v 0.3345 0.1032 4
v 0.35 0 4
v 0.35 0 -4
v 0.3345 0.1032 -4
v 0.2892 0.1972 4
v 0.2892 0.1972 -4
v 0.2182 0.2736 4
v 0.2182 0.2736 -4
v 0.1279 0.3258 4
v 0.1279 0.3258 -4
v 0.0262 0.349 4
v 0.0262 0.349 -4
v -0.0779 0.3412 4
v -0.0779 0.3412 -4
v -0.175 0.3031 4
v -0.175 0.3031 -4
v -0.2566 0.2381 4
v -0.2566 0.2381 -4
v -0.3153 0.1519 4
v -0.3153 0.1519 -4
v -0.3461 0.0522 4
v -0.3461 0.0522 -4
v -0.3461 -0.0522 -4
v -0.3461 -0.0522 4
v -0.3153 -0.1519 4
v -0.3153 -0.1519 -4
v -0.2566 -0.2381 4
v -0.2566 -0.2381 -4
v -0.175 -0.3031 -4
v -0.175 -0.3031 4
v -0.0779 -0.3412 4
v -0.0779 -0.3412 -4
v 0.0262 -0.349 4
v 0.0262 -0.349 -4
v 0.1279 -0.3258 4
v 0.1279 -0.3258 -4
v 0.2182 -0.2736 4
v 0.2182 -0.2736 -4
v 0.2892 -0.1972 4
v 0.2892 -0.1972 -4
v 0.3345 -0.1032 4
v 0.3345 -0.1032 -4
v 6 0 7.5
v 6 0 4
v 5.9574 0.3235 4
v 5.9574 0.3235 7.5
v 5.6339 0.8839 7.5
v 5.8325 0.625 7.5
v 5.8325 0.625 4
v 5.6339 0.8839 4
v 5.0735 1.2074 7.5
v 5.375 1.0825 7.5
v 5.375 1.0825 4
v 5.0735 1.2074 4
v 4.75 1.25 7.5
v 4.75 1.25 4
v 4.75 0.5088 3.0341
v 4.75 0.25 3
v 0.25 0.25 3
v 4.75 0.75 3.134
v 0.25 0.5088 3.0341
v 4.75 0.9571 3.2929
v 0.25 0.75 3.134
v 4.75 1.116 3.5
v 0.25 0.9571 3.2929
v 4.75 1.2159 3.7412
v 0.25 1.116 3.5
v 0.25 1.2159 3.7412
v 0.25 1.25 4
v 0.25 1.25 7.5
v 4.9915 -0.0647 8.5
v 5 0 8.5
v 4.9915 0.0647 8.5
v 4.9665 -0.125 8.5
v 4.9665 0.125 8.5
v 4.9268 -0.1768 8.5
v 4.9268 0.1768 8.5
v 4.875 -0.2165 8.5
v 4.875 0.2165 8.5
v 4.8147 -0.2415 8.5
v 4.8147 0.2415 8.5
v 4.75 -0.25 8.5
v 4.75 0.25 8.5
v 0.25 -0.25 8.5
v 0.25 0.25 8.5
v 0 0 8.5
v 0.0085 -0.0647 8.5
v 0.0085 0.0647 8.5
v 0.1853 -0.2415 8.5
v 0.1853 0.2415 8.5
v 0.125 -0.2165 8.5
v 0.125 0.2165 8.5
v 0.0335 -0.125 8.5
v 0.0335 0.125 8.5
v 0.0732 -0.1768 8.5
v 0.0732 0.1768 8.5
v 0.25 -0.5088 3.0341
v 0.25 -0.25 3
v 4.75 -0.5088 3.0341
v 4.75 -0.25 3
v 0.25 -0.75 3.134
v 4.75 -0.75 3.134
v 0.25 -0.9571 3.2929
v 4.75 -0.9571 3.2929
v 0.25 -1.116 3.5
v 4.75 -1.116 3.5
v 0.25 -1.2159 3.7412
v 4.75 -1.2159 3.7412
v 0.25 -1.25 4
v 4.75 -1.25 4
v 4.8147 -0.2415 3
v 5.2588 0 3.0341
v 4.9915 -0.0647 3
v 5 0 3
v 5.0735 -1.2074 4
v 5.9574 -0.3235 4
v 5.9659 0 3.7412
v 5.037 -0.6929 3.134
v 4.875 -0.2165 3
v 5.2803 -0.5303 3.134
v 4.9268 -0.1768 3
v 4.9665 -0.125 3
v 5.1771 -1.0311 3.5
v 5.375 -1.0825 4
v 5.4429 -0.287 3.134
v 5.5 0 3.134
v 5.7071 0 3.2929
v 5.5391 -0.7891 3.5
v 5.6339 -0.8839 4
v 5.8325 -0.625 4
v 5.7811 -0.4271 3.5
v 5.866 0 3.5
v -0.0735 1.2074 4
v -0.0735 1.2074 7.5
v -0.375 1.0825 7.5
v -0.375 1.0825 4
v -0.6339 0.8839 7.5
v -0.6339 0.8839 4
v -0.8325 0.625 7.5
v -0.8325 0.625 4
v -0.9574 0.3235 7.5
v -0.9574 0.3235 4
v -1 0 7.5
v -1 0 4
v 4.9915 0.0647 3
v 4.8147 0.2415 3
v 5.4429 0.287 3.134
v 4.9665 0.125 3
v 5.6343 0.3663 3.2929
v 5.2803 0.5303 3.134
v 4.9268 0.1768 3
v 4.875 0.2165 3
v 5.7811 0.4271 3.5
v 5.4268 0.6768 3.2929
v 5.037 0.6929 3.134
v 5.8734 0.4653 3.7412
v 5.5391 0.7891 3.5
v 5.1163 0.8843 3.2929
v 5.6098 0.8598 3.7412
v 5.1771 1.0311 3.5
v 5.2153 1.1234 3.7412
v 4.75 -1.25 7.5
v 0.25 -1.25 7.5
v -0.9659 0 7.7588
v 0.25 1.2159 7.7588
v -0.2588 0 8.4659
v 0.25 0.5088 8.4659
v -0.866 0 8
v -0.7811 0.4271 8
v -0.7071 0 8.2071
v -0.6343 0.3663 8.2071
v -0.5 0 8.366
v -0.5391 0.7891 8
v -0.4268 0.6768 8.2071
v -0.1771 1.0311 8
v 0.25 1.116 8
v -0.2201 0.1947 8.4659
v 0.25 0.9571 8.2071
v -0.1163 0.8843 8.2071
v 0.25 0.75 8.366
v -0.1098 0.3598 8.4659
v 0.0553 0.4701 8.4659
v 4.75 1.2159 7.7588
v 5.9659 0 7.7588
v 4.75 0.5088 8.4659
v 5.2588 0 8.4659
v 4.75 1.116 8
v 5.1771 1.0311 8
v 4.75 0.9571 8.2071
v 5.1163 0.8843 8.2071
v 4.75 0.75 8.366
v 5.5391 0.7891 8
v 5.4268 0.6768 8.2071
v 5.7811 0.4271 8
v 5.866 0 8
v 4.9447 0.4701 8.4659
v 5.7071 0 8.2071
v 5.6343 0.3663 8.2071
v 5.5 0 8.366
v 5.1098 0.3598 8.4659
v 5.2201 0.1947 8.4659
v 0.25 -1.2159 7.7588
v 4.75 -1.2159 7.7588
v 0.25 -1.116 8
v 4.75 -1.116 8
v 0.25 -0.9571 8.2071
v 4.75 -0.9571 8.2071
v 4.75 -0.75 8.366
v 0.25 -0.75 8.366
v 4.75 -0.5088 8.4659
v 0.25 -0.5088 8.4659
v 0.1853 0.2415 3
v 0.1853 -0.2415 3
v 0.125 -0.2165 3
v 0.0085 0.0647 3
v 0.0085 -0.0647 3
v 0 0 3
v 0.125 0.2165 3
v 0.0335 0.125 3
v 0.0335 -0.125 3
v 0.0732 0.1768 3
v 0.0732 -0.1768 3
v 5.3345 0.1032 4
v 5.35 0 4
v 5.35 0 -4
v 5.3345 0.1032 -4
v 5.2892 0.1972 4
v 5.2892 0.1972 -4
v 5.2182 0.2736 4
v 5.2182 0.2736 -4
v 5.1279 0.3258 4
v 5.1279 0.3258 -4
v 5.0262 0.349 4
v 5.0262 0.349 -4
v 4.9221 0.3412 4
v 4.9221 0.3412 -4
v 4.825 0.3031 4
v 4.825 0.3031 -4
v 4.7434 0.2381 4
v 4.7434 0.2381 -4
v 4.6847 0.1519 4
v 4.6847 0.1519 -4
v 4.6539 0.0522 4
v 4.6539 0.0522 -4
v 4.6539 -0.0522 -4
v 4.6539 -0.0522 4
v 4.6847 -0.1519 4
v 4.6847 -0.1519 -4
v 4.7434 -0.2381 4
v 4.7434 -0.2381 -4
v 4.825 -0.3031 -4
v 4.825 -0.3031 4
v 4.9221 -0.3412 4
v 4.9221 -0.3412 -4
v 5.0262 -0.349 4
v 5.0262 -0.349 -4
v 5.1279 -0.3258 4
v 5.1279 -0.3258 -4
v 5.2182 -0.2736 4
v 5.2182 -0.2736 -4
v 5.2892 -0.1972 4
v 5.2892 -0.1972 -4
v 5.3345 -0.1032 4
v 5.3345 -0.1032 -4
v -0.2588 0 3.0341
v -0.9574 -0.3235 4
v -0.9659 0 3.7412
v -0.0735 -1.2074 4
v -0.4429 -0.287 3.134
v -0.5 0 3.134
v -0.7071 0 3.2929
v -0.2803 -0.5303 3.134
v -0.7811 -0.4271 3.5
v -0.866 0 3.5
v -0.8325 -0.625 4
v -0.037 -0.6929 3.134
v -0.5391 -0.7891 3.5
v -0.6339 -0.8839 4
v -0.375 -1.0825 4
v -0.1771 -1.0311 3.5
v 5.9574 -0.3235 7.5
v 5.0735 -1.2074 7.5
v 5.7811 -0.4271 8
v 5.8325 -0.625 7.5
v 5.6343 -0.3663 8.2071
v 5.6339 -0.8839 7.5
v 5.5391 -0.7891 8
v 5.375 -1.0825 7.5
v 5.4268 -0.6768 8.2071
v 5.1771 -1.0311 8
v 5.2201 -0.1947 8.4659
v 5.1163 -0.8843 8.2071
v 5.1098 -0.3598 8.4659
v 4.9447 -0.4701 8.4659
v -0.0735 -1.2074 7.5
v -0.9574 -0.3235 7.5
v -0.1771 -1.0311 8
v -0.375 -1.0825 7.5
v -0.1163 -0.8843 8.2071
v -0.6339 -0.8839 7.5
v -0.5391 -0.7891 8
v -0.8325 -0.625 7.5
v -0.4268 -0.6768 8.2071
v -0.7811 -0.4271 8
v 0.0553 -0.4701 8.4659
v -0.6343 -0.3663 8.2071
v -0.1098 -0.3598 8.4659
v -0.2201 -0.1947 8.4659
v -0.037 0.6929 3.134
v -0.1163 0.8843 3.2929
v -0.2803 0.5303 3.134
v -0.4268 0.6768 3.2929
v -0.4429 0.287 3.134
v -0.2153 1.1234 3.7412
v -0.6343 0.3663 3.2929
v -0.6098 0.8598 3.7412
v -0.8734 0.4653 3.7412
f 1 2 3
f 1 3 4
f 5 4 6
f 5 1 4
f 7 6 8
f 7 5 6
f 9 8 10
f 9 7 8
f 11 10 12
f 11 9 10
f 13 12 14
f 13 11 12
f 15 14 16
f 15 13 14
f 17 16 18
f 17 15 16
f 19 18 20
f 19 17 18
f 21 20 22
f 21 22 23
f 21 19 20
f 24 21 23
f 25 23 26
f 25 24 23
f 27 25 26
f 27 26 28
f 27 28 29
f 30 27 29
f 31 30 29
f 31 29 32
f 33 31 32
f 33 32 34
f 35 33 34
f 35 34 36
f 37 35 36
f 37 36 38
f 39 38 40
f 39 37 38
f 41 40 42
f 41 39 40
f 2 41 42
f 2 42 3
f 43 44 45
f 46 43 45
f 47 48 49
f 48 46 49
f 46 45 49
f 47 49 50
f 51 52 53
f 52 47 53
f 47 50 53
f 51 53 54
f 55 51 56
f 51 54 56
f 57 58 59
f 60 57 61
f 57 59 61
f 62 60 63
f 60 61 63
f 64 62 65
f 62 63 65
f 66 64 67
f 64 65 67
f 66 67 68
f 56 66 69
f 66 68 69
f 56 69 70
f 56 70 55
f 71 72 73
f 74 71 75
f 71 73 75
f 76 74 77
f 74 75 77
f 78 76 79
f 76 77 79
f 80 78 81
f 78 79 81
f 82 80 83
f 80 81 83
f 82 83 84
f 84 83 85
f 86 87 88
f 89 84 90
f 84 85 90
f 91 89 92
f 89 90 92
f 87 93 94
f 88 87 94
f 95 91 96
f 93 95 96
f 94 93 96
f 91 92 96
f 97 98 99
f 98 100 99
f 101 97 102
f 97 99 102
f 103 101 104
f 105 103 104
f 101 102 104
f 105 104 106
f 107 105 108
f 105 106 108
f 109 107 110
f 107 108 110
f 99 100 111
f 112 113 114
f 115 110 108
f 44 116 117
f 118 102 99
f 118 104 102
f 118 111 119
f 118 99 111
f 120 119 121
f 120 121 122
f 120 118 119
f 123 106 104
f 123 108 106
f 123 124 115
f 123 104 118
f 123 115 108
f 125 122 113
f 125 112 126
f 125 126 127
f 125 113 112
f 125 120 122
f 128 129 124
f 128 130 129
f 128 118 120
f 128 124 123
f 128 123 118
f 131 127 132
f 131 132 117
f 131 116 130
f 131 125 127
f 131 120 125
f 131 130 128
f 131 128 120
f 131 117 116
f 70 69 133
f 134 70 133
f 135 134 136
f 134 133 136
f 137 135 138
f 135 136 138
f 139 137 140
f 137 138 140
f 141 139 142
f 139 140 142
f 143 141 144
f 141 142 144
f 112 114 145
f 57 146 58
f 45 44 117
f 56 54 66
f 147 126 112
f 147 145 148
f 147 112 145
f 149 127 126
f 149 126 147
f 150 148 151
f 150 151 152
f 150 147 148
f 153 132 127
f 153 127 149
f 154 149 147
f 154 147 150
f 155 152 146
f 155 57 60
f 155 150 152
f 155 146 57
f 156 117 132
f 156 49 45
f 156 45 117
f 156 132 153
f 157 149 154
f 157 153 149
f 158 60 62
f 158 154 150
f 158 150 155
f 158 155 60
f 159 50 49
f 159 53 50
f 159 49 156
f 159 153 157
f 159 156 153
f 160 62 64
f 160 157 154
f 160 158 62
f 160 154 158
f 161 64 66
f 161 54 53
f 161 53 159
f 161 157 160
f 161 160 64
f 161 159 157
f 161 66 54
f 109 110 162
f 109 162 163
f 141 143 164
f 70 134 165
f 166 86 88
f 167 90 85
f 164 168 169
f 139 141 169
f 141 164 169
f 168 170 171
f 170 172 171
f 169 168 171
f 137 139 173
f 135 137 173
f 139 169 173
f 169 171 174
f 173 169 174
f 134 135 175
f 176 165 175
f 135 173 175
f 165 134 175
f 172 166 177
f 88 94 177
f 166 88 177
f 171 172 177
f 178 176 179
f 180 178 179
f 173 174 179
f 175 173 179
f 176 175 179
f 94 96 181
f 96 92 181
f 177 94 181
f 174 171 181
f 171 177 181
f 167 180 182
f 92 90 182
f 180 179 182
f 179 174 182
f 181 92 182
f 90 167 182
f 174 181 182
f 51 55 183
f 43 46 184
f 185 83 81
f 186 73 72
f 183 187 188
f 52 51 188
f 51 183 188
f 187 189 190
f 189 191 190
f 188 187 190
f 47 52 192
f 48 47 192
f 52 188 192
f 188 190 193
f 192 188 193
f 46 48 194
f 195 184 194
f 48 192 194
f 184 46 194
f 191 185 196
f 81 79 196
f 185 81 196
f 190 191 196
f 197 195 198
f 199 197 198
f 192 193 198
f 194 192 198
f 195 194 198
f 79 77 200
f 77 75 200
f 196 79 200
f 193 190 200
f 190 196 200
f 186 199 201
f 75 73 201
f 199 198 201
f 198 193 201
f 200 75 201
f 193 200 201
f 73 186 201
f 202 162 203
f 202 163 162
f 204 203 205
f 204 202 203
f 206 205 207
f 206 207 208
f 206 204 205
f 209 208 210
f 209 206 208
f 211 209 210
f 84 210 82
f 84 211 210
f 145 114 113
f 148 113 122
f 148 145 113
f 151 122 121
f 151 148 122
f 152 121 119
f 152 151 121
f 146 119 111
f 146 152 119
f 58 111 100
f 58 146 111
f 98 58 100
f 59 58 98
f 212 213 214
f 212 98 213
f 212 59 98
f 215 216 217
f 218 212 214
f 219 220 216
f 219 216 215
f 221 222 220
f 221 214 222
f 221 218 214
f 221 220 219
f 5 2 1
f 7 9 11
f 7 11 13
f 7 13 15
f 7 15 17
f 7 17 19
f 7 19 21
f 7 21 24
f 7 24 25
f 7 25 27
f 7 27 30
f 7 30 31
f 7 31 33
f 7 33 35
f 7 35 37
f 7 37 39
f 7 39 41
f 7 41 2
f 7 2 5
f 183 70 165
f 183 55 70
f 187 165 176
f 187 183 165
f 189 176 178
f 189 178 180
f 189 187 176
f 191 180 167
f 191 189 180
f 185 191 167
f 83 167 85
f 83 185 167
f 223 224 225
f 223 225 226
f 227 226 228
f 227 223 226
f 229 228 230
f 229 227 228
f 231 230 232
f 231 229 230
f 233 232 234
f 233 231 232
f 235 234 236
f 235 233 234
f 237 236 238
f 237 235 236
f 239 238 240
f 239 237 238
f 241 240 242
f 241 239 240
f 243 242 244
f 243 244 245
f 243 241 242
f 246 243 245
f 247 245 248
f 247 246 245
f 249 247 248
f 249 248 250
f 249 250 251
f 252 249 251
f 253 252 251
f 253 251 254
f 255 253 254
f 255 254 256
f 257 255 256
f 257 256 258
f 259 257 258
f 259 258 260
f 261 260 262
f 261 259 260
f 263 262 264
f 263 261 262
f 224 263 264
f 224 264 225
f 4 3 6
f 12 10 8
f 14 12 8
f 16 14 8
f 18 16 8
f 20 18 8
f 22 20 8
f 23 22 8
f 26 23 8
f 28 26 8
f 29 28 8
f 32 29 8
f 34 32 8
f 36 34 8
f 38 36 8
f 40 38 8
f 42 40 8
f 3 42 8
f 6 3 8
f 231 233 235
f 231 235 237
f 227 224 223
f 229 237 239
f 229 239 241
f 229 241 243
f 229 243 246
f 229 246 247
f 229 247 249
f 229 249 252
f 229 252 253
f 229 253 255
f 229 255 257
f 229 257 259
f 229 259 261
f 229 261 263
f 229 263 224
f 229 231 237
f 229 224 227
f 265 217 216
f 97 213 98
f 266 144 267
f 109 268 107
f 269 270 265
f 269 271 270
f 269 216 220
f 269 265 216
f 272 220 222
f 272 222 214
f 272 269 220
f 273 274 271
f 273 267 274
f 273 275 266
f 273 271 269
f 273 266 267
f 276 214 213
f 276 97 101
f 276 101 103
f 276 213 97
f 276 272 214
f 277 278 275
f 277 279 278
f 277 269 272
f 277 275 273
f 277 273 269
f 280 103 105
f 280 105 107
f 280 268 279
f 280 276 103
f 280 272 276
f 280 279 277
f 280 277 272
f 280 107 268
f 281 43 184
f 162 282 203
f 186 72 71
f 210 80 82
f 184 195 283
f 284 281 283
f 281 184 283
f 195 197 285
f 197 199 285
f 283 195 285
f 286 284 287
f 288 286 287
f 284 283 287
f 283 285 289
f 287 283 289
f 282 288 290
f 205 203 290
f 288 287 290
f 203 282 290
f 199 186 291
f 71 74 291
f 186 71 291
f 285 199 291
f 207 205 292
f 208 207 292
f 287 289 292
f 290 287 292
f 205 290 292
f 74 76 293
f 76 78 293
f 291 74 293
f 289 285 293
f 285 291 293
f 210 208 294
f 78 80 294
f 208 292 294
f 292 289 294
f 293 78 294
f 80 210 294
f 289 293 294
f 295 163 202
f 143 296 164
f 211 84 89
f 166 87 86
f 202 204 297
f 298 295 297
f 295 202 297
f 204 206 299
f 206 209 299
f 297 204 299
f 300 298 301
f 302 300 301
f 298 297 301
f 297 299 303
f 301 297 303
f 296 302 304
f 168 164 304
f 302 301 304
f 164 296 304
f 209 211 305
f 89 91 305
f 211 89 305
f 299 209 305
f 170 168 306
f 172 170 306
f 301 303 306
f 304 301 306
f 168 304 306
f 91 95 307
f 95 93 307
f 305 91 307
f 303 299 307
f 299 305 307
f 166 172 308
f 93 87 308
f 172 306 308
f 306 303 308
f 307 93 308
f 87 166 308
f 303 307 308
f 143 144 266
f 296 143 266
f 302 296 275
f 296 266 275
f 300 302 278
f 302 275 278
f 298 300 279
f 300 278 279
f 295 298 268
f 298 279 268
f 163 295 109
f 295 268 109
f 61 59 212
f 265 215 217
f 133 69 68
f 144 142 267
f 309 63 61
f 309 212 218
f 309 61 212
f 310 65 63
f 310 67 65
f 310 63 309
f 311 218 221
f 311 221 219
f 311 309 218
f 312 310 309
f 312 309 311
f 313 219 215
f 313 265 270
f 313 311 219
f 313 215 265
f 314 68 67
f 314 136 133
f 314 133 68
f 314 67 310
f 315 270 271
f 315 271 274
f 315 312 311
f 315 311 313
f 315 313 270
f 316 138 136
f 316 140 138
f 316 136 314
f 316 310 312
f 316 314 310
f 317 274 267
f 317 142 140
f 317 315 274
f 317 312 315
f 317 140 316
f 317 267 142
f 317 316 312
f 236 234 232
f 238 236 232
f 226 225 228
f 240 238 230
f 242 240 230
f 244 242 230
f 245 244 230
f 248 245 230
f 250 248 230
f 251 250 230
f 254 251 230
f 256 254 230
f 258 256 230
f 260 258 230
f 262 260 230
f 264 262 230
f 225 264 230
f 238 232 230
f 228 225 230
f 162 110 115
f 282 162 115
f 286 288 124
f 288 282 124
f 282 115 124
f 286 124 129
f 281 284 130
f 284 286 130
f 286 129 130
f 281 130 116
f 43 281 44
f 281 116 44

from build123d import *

# Parameters (mm, degrees)
SKETCH_R     = 0.35
PAD_DEPTH    = 8
PAD002_DEPTH = 5.5
FILLET_R     = 1
FILLET001_R  = 1


with BuildPart() as pad:
    # Sketch → Pad (new body)
    with BuildSketch(Plane.XY.offset(4)):
        Circle(SKETCH_R)
        with Locations((5, 0)):
            Circle(SKETCH_R)
    extrude(amount=-PAD_DEPTH)


with BuildPart() as fillet001:
    # Sketch003 → Pad002 (new body)
    with BuildSketch(Plane.XY.offset(3)):
        with BuildLine():
            Line((0.25, 1.25), (4.75, 1.25))
            ThreePointArc((6, 0), (5.633883, 0.883883), (4.75, 1.25))
            ThreePointArc((4.75, -1.25), (5.633883, -0.883883), (6, 0))
            Line((4.75, -1.25), (0.25, -1.25))
            ThreePointArc((-1, 0), (-0.633883, -0.883883), (0.25, -1.25))
            ThreePointArc((0.25, 1.25), (-0.633883, 0.883883), (-1, 0))
        make_face()
    extrude(amount=PAD002_DEPTH)

    # Fillet
    fillet_edges = [fillet001.edges().sort_by_distance(p)[0] for p in [
        (2.5, 1.25, 8.5),
        (-0.633883, 0.883883, 8.5),
        (-0.633883, -0.883883, 8.5),
        (2.5, -1.25, 8.5),
        (5.633883, -0.883883, 8.5),
        (5.633883, 0.883883, 8.5),
    ]]
    fillet(fillet_edges, radius=FILLET_R)

    # Fillet001
    fillet001_edges = [fillet001.edges().sort_by_distance(p)[0] for p in [
        (5.633883, -0.883883, 3),
        (5.633883, 0.883883, 3),
        (2.5, 1.25, 3),
        (2.5, -1.25, 3),
        (-0.633883, -0.883883, 3),
        (-0.633883, 0.883883, 3),
    ]]
    fillet(fillet001_edges, radius=FILLET001_R)


solid = Compound([pad.part, fillet001.part])
